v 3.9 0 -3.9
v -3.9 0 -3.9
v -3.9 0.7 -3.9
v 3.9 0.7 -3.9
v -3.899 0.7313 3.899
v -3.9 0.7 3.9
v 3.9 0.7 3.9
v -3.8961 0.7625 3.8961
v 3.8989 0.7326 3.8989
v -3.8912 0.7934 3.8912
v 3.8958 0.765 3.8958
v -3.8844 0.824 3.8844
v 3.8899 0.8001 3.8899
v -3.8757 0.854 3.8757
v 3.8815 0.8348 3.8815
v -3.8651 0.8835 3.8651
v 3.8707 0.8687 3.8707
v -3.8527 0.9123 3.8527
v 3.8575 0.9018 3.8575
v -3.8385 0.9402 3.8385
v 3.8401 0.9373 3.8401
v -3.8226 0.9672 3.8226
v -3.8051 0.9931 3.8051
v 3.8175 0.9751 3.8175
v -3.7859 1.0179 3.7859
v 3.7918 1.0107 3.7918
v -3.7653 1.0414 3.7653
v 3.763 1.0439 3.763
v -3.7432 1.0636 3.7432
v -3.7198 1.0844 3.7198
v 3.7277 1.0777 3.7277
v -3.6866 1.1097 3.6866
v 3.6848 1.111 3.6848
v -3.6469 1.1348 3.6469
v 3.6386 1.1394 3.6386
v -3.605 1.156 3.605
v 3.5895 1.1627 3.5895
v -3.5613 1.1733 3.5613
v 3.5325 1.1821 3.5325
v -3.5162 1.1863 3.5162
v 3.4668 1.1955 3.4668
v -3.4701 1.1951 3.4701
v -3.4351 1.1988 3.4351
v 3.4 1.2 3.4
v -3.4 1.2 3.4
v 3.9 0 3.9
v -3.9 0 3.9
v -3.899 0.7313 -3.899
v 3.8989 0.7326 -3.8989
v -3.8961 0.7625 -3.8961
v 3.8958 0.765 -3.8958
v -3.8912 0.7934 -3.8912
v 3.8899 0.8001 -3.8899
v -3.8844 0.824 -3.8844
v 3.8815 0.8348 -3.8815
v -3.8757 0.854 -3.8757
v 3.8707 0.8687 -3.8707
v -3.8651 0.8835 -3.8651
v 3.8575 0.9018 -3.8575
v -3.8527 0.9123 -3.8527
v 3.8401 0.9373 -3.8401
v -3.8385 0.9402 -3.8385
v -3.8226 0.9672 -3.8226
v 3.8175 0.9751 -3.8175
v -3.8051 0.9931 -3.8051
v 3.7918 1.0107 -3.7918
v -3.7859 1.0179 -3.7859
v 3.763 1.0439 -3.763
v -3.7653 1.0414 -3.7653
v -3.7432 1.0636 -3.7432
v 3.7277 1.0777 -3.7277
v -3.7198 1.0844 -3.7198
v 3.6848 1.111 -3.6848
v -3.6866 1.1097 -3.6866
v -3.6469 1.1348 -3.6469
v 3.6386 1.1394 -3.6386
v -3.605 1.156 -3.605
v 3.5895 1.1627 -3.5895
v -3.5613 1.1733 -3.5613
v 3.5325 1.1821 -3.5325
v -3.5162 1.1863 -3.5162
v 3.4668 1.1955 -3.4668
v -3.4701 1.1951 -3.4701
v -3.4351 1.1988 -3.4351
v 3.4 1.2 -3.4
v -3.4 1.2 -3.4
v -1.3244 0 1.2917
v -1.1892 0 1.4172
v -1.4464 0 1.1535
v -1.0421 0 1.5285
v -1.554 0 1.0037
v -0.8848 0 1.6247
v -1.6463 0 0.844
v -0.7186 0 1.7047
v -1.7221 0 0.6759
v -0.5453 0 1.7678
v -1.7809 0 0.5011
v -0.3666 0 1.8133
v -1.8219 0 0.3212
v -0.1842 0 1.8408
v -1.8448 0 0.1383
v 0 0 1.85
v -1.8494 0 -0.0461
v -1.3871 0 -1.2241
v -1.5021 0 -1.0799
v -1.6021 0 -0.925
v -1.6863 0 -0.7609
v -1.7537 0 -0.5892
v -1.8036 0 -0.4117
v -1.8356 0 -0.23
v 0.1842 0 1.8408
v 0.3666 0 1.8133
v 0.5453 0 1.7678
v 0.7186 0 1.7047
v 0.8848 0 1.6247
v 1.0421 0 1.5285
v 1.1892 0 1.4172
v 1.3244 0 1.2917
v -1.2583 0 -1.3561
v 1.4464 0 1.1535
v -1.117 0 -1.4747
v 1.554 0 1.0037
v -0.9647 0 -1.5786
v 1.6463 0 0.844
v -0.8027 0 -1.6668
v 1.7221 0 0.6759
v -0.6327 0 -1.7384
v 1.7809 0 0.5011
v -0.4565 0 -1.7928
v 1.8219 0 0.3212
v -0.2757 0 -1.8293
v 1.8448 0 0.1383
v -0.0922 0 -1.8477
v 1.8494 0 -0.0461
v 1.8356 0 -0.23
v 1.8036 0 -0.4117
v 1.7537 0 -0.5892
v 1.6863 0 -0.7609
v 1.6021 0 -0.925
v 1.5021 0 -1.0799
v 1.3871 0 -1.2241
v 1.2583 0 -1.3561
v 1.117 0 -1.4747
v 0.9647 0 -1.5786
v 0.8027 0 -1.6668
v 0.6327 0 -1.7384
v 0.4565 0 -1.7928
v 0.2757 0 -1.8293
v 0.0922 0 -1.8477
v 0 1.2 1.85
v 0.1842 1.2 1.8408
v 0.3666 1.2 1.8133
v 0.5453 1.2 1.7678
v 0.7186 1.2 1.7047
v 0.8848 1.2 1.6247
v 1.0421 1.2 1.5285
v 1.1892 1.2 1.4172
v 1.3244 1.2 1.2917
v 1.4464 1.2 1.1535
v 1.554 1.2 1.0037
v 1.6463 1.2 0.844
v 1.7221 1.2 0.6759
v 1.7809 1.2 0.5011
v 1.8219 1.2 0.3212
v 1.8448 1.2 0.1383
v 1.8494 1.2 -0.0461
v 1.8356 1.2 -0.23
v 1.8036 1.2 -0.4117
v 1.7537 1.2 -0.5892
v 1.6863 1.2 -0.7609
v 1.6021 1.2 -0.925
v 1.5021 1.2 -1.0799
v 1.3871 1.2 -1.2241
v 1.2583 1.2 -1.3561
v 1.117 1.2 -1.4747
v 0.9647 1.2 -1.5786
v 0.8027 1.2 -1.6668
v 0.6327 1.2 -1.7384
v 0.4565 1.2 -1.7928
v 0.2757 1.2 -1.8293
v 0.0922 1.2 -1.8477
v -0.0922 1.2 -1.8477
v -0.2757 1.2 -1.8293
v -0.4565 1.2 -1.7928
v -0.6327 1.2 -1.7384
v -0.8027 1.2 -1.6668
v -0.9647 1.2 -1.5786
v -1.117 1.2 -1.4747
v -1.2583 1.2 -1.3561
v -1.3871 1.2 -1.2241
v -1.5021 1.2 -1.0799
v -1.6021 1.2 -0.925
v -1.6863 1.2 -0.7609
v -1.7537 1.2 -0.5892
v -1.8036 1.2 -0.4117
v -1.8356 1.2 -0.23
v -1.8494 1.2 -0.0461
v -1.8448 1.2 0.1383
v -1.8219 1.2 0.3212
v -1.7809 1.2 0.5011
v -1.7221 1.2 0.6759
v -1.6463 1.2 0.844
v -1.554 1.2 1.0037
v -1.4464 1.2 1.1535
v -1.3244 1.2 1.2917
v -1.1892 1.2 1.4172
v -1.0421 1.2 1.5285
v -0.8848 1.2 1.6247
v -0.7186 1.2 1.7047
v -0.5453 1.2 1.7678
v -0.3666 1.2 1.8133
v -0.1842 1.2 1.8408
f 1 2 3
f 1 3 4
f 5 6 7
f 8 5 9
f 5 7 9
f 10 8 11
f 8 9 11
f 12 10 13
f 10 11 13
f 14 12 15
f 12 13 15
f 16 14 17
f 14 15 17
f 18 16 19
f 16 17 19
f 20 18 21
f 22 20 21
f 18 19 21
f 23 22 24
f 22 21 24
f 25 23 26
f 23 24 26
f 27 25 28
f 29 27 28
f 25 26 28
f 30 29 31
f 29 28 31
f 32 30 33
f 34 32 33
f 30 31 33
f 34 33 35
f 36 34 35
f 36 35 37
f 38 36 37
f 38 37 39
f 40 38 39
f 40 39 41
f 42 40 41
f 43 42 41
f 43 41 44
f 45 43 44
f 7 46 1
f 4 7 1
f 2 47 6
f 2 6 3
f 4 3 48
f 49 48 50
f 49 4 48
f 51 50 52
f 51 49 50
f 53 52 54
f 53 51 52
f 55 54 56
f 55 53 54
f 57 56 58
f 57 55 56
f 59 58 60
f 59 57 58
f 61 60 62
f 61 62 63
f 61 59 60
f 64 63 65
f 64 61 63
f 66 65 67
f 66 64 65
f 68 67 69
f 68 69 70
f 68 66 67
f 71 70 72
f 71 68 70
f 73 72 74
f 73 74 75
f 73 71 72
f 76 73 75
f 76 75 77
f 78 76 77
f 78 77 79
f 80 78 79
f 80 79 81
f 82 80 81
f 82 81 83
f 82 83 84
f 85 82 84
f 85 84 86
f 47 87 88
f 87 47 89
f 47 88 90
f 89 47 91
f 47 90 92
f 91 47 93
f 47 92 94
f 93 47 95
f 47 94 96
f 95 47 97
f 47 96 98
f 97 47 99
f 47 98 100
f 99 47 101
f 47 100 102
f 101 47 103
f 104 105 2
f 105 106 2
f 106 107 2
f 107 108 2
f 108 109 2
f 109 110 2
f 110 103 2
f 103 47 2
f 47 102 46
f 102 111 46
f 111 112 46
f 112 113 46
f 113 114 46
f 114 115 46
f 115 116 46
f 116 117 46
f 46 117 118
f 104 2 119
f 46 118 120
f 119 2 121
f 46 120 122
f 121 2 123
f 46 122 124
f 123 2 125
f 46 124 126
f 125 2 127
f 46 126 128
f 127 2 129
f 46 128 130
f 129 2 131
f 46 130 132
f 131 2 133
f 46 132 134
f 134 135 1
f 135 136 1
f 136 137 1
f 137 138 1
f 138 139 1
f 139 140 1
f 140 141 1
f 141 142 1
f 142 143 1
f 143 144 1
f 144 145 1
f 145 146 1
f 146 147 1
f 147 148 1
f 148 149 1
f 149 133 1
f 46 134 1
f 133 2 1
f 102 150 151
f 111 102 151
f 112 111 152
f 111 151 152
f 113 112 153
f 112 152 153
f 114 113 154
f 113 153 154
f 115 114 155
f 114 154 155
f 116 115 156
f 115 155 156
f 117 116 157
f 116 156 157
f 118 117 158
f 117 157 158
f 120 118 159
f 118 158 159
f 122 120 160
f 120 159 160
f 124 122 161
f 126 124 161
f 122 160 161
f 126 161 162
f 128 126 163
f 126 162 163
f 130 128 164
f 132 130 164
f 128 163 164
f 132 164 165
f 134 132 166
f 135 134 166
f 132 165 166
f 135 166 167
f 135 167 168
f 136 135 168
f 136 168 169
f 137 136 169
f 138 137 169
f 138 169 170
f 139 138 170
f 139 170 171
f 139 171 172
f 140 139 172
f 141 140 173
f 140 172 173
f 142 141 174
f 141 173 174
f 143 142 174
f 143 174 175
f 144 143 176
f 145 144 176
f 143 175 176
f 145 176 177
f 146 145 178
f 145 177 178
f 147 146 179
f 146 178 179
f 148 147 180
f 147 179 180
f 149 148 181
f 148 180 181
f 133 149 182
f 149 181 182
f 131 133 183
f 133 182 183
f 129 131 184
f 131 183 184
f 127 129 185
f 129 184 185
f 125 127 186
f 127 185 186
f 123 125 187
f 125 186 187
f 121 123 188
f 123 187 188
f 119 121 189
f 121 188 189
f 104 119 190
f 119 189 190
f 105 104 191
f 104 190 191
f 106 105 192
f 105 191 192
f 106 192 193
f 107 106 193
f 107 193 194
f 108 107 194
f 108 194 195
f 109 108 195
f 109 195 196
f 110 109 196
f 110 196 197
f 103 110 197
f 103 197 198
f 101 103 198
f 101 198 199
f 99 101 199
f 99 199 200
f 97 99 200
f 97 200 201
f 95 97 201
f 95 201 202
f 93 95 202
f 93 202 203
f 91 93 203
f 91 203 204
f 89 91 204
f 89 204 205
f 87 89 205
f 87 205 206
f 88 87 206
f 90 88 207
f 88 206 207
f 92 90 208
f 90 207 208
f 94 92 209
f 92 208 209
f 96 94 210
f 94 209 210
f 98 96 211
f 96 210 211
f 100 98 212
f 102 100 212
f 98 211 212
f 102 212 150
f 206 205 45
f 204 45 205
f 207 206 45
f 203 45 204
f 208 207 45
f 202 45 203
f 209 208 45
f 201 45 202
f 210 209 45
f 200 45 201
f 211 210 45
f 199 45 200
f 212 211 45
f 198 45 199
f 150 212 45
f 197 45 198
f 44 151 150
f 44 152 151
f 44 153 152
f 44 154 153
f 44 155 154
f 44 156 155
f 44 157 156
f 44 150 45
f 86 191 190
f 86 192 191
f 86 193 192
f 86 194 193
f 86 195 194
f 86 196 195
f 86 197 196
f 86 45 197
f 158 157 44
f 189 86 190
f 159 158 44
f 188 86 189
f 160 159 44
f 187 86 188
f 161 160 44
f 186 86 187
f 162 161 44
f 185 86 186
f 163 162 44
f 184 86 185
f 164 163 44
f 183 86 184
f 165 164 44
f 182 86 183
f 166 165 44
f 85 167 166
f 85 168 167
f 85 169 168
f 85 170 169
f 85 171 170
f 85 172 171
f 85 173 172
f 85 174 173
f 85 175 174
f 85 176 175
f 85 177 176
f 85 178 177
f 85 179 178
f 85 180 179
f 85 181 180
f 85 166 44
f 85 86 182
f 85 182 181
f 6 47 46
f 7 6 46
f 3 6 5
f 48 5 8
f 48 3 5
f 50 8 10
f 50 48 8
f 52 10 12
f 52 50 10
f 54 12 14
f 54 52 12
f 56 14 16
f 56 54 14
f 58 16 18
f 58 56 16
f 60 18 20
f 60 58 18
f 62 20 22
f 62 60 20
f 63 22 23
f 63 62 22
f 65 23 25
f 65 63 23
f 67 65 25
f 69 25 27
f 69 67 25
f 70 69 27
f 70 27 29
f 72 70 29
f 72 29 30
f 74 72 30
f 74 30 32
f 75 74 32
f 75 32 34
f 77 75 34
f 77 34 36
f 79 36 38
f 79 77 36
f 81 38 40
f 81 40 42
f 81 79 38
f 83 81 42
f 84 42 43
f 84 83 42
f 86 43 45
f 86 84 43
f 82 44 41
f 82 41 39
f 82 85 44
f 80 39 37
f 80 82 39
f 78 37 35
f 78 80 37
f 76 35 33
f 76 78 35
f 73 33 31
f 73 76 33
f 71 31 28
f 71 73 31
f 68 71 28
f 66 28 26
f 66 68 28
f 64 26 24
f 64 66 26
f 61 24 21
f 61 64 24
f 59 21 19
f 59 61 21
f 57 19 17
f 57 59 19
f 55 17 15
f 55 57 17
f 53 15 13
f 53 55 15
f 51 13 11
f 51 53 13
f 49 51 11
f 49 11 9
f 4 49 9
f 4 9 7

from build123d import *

# Parameters (mm, degrees)
SKETCH_1_W          = 7.8
SKETCH_1_H          = 7.8
EXTRUDE_1_DEPTH     = 1.2
SKETCH_2_R          = 1.85
CUT_EXTRUDE_1_DEPTH = 1.2
FILLET_1_R          = 0.5


with BuildPart() as part:
    # 草图1 → 拉伸1 (new body)
    with BuildSketch(Plane(origin=(0, 0, 0), x_dir=(1, 0, 0), z_dir=(0, 1, 0))):
        Rectangle(SKETCH_1_W, SKETCH_1_H)
    extrude(amount=EXTRUDE_1_DEPTH)

    # 草图2 → 切除-拉伸1 (cut)
    with BuildSketch(Plane(origin=(0, 1.2, 0), x_dir=(-1, 0, 0), z_dir=(0, 1, 0))):
        with Locations(Location((0, 0, 0), (0, 0, 90))):
            Circle(SKETCH_2_R)
    extrude(amount=-CUT_EXTRUDE_1_DEPTH, mode=Mode.SUBTRACT)

    # 圆角1
    fillet_1_edges = [part.edges().sort_by_distance(p)[0] for p in [
        (3.9, 1.2, 0),
        (0, 1.2, -3.9),
        (-3.9, 1.2, 0),
        (0, 1.2, 3.9),
    ]]
    fillet(fillet_1_edges, radius=FILLET_1_R)


solid = part.part
